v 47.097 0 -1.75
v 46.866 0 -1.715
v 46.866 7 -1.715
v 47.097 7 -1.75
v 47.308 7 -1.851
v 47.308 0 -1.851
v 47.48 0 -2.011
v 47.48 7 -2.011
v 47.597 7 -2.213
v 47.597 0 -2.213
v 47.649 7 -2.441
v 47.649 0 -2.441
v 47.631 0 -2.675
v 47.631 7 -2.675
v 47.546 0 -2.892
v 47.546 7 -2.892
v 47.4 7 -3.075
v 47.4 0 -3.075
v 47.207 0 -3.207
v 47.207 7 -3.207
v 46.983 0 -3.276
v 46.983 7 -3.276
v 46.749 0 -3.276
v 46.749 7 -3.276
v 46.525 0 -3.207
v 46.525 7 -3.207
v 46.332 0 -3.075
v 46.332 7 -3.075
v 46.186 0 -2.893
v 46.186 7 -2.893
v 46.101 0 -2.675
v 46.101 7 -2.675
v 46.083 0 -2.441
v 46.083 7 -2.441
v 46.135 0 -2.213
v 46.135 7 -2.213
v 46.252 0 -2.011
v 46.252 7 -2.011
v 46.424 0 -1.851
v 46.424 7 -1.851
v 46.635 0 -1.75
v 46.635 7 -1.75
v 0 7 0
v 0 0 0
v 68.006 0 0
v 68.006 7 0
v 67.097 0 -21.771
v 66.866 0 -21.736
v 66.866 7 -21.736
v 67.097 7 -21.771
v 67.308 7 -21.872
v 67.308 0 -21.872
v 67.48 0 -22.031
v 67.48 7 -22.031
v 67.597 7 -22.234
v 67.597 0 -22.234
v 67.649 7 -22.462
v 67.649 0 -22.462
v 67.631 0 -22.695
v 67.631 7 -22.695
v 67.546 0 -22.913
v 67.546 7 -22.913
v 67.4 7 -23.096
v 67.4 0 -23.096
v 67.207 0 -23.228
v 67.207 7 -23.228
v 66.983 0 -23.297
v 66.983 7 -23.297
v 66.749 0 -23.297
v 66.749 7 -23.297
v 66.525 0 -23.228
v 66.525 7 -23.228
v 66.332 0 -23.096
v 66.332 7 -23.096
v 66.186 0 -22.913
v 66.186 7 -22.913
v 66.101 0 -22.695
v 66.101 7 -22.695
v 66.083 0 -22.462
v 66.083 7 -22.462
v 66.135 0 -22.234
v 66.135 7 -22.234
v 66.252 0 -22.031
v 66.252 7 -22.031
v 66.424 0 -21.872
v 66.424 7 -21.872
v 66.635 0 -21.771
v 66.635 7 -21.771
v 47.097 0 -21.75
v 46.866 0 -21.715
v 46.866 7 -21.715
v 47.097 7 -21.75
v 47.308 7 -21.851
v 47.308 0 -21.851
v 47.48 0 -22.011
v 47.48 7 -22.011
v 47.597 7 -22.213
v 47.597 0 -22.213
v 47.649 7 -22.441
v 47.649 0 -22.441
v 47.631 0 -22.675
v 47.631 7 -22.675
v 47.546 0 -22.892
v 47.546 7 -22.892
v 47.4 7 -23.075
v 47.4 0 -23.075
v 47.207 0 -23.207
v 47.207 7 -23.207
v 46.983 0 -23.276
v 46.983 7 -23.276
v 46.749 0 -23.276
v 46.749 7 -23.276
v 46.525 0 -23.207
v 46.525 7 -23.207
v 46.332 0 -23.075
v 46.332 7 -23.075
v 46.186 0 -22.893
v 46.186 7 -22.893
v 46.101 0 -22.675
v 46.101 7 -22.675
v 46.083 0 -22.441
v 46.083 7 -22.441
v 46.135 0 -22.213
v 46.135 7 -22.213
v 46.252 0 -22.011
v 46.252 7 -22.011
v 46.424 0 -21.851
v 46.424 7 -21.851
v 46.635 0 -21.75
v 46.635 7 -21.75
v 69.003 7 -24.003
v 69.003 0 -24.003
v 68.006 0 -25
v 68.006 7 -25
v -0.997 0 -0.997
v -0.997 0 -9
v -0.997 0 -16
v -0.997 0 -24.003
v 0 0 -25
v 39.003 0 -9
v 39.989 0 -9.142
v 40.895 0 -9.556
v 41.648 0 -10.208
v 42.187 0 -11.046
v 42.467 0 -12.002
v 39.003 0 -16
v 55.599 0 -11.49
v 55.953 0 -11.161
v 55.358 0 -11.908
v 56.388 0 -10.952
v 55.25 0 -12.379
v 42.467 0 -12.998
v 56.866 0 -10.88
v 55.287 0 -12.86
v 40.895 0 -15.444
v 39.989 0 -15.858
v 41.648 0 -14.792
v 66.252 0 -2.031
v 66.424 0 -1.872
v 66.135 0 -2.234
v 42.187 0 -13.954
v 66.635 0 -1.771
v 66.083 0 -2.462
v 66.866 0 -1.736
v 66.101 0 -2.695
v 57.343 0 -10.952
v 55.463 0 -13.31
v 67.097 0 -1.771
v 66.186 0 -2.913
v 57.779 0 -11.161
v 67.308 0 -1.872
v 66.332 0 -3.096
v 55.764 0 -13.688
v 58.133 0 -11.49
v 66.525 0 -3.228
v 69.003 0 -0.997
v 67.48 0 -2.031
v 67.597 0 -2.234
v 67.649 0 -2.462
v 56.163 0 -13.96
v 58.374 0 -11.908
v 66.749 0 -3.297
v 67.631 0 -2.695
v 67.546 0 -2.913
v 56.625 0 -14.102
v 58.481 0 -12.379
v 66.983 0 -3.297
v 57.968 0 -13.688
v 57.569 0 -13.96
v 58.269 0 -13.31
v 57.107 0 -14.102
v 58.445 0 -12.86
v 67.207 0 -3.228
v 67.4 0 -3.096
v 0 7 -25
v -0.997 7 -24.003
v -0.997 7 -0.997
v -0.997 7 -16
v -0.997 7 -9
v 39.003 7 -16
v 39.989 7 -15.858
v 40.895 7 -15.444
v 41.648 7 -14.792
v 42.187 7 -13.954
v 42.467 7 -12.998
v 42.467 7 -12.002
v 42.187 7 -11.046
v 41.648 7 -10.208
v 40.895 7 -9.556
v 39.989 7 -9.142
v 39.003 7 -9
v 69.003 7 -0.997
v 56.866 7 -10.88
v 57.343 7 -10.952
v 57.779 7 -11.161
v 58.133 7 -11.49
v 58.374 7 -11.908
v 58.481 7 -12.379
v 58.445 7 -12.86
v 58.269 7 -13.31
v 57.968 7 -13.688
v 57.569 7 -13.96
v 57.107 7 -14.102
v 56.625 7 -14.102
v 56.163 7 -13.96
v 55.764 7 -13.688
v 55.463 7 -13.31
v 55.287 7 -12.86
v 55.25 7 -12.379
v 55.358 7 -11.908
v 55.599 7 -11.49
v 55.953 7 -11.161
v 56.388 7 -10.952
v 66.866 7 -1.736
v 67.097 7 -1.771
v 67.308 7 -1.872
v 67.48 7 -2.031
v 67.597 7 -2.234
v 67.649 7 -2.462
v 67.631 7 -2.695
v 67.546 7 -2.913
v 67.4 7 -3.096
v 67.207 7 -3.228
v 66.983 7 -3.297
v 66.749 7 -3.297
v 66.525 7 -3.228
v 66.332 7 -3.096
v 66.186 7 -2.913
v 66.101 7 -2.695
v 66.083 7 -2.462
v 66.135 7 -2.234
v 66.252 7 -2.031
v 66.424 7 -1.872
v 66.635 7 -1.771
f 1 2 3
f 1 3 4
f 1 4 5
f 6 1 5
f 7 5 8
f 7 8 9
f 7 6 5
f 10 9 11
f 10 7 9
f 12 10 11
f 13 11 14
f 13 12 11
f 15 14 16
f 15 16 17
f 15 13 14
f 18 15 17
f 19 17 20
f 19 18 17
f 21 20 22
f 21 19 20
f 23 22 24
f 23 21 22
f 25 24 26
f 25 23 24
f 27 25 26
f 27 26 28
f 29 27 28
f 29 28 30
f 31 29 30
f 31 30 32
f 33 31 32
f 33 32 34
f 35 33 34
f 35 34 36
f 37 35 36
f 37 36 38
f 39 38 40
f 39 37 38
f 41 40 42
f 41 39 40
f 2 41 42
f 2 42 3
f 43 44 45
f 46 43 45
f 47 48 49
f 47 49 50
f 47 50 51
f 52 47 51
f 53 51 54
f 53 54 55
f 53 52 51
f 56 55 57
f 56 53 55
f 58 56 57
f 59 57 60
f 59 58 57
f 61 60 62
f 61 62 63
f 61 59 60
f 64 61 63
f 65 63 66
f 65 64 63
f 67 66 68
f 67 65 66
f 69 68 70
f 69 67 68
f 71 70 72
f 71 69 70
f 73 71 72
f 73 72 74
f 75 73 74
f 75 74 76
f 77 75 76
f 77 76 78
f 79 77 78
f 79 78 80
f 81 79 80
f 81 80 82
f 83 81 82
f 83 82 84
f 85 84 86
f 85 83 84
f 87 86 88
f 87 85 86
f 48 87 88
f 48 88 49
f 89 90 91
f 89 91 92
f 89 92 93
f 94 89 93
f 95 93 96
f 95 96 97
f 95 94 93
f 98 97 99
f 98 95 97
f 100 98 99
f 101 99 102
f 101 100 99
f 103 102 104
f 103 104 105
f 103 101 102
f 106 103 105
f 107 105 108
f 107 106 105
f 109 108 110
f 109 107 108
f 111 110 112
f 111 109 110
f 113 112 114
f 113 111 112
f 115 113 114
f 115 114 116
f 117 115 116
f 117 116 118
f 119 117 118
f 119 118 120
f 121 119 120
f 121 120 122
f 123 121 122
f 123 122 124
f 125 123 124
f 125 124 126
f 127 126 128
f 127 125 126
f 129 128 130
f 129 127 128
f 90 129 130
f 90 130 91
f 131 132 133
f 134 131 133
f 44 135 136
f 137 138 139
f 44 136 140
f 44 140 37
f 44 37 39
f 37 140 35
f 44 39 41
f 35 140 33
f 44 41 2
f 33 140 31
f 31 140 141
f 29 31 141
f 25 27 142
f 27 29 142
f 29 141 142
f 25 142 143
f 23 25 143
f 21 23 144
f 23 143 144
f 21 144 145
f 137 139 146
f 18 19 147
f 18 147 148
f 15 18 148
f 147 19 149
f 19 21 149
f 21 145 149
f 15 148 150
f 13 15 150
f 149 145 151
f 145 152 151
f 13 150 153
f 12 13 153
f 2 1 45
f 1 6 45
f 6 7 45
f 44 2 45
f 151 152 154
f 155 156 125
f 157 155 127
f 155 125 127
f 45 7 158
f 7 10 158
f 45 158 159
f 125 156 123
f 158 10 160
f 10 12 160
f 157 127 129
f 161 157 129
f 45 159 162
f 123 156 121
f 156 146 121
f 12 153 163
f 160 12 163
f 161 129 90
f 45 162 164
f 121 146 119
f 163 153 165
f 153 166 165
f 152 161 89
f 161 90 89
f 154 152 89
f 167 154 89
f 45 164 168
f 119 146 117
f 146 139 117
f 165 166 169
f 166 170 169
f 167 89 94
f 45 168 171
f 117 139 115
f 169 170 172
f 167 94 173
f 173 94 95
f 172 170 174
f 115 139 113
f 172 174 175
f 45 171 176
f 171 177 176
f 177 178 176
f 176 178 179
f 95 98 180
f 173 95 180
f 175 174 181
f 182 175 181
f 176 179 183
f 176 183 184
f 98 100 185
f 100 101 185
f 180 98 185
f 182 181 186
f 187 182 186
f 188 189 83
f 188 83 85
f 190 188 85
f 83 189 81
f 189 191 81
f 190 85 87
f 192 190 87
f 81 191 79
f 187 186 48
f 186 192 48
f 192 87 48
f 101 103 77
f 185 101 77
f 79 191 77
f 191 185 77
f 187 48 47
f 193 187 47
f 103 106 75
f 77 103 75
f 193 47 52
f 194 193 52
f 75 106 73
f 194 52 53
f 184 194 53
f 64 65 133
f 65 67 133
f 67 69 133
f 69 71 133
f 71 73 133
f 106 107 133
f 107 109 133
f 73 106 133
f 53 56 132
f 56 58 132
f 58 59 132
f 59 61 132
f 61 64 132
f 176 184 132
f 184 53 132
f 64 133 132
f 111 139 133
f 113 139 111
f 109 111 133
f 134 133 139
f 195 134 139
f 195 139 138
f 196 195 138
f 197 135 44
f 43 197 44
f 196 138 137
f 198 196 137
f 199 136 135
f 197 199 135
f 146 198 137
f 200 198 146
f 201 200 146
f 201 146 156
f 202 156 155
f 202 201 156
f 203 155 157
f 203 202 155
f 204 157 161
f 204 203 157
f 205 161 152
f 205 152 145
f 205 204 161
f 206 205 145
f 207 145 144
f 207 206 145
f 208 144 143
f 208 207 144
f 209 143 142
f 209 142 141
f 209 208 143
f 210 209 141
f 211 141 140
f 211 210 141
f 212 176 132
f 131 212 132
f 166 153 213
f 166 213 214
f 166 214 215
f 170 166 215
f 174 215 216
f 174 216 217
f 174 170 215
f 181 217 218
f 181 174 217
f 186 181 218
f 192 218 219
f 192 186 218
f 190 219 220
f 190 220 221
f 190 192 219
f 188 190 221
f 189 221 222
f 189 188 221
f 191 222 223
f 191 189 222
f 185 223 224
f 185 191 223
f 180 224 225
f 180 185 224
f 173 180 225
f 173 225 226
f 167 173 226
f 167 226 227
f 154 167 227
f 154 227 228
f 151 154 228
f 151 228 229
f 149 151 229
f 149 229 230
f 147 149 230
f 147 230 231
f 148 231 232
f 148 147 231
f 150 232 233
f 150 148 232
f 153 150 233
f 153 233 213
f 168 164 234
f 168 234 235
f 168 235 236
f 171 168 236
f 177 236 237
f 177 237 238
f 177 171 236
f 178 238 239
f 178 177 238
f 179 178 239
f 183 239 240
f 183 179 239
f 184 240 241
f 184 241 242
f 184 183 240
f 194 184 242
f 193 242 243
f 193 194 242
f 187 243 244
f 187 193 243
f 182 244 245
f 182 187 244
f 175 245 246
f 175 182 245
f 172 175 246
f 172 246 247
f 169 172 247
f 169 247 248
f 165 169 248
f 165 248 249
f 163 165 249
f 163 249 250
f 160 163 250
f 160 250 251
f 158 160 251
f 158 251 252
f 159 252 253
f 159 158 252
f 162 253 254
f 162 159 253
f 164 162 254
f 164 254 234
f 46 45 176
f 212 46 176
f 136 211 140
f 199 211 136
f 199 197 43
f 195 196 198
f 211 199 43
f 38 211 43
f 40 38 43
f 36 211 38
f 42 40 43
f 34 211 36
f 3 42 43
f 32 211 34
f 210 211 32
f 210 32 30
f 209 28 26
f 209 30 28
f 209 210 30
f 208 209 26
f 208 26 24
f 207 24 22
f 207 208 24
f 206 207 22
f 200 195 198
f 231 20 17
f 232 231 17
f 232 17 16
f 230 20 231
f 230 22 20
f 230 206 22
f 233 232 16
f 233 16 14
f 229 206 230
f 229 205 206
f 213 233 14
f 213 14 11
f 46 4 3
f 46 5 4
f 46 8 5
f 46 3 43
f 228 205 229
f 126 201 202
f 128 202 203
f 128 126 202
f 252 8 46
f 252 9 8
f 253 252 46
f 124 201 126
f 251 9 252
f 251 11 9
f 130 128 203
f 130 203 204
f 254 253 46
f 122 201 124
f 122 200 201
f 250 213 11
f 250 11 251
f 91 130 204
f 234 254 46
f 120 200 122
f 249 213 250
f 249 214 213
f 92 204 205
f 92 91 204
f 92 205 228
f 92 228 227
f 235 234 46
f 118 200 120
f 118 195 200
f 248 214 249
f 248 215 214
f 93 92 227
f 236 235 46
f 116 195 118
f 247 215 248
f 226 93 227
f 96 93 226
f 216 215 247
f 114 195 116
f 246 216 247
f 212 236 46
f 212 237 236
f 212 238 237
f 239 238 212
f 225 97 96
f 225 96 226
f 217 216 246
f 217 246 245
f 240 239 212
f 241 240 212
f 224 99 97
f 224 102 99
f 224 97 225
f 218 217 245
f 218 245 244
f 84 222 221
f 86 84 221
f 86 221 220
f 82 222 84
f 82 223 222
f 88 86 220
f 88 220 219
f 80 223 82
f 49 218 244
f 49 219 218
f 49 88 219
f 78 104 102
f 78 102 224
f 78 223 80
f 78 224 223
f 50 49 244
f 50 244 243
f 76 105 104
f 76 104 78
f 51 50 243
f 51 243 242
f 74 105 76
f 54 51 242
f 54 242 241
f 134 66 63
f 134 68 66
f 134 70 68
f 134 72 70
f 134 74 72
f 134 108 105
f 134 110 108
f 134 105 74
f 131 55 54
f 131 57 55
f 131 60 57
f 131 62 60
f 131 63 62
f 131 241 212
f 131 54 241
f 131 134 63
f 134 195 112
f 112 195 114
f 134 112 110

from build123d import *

# Parameters (mm, degrees)
SKETCH1_R           = 0.785
SKETCH1_R_2         = 1.62
BOSS_EXTRUDE1_DEPTH = 7
CUT_EXTRUDE1_DEPTH  = 7


with BuildPart() as part:
    # Sketch1 → Boss-Extrude1 (new body)
    with BuildSketch(Plane(origin=(0, 0, 0), x_dir=(1, 0, 0), z_dir=(0, 1, 0))):
        Polygon((0, 0), (68.005958877, 0), (69.002979439, 0.997020561), (69.002979439, 24.002979439), (68.005958877, 25), (0, 25), (-0.997020561, 24.002979439), (-0.997020561, 0.997020561), align=None)
        with Locations(Location((66.865958877, 2.520750677, 0), (0, 0, 270))):
            Circle(SKETCH1_R, mode=Mode.SUBTRACT)
        with Locations(Location((66.865958877, 22.520750677, 0), (0, 0, 270))):
            Circle(SKETCH1_R, mode=Mode.SUBTRACT)
        with Locations(Location((46.865958877, 22.5, 0), (0, 0, 270))):
            Circle(SKETCH1_R, mode=Mode.SUBTRACT)
        with Locations(Location((46.865958877, 2.5, 0), (0, 0, 270))):
            Circle(SKETCH1_R, mode=Mode.SUBTRACT)
        with Locations(Location((56.865958877, 12.5, 0), (0, 0, 270))):
            Circle(SKETCH1_R_2, mode=Mode.SUBTRACT)
    extrude(amount=BOSS_EXTRUDE1_DEPTH)

    # Sketch2 → Cut-Extrude1 (cut)
    with BuildSketch(Plane(origin=(0, 7, 0), x_dir=(1, 0, 0), z_dir=(0, 1, 0))):
        with BuildLine():
            Line((-0.997020561, 16), (39.002979439, 16))
            ThreePointArc((39.002979439, 16), (42.502979439, 12.5), (39.002979439, 9))
            Line((39.002979439, 9), (-0.997020561, 9))
            ThreePointArc((-0.997020561, 9), (-4.497020561, 12.5), (-0.997020561, 16))
        make_face()
    extrude(amount=-CUT_EXTRUDE1_DEPTH, mode=Mode.SUBTRACT)


solid = part.part
